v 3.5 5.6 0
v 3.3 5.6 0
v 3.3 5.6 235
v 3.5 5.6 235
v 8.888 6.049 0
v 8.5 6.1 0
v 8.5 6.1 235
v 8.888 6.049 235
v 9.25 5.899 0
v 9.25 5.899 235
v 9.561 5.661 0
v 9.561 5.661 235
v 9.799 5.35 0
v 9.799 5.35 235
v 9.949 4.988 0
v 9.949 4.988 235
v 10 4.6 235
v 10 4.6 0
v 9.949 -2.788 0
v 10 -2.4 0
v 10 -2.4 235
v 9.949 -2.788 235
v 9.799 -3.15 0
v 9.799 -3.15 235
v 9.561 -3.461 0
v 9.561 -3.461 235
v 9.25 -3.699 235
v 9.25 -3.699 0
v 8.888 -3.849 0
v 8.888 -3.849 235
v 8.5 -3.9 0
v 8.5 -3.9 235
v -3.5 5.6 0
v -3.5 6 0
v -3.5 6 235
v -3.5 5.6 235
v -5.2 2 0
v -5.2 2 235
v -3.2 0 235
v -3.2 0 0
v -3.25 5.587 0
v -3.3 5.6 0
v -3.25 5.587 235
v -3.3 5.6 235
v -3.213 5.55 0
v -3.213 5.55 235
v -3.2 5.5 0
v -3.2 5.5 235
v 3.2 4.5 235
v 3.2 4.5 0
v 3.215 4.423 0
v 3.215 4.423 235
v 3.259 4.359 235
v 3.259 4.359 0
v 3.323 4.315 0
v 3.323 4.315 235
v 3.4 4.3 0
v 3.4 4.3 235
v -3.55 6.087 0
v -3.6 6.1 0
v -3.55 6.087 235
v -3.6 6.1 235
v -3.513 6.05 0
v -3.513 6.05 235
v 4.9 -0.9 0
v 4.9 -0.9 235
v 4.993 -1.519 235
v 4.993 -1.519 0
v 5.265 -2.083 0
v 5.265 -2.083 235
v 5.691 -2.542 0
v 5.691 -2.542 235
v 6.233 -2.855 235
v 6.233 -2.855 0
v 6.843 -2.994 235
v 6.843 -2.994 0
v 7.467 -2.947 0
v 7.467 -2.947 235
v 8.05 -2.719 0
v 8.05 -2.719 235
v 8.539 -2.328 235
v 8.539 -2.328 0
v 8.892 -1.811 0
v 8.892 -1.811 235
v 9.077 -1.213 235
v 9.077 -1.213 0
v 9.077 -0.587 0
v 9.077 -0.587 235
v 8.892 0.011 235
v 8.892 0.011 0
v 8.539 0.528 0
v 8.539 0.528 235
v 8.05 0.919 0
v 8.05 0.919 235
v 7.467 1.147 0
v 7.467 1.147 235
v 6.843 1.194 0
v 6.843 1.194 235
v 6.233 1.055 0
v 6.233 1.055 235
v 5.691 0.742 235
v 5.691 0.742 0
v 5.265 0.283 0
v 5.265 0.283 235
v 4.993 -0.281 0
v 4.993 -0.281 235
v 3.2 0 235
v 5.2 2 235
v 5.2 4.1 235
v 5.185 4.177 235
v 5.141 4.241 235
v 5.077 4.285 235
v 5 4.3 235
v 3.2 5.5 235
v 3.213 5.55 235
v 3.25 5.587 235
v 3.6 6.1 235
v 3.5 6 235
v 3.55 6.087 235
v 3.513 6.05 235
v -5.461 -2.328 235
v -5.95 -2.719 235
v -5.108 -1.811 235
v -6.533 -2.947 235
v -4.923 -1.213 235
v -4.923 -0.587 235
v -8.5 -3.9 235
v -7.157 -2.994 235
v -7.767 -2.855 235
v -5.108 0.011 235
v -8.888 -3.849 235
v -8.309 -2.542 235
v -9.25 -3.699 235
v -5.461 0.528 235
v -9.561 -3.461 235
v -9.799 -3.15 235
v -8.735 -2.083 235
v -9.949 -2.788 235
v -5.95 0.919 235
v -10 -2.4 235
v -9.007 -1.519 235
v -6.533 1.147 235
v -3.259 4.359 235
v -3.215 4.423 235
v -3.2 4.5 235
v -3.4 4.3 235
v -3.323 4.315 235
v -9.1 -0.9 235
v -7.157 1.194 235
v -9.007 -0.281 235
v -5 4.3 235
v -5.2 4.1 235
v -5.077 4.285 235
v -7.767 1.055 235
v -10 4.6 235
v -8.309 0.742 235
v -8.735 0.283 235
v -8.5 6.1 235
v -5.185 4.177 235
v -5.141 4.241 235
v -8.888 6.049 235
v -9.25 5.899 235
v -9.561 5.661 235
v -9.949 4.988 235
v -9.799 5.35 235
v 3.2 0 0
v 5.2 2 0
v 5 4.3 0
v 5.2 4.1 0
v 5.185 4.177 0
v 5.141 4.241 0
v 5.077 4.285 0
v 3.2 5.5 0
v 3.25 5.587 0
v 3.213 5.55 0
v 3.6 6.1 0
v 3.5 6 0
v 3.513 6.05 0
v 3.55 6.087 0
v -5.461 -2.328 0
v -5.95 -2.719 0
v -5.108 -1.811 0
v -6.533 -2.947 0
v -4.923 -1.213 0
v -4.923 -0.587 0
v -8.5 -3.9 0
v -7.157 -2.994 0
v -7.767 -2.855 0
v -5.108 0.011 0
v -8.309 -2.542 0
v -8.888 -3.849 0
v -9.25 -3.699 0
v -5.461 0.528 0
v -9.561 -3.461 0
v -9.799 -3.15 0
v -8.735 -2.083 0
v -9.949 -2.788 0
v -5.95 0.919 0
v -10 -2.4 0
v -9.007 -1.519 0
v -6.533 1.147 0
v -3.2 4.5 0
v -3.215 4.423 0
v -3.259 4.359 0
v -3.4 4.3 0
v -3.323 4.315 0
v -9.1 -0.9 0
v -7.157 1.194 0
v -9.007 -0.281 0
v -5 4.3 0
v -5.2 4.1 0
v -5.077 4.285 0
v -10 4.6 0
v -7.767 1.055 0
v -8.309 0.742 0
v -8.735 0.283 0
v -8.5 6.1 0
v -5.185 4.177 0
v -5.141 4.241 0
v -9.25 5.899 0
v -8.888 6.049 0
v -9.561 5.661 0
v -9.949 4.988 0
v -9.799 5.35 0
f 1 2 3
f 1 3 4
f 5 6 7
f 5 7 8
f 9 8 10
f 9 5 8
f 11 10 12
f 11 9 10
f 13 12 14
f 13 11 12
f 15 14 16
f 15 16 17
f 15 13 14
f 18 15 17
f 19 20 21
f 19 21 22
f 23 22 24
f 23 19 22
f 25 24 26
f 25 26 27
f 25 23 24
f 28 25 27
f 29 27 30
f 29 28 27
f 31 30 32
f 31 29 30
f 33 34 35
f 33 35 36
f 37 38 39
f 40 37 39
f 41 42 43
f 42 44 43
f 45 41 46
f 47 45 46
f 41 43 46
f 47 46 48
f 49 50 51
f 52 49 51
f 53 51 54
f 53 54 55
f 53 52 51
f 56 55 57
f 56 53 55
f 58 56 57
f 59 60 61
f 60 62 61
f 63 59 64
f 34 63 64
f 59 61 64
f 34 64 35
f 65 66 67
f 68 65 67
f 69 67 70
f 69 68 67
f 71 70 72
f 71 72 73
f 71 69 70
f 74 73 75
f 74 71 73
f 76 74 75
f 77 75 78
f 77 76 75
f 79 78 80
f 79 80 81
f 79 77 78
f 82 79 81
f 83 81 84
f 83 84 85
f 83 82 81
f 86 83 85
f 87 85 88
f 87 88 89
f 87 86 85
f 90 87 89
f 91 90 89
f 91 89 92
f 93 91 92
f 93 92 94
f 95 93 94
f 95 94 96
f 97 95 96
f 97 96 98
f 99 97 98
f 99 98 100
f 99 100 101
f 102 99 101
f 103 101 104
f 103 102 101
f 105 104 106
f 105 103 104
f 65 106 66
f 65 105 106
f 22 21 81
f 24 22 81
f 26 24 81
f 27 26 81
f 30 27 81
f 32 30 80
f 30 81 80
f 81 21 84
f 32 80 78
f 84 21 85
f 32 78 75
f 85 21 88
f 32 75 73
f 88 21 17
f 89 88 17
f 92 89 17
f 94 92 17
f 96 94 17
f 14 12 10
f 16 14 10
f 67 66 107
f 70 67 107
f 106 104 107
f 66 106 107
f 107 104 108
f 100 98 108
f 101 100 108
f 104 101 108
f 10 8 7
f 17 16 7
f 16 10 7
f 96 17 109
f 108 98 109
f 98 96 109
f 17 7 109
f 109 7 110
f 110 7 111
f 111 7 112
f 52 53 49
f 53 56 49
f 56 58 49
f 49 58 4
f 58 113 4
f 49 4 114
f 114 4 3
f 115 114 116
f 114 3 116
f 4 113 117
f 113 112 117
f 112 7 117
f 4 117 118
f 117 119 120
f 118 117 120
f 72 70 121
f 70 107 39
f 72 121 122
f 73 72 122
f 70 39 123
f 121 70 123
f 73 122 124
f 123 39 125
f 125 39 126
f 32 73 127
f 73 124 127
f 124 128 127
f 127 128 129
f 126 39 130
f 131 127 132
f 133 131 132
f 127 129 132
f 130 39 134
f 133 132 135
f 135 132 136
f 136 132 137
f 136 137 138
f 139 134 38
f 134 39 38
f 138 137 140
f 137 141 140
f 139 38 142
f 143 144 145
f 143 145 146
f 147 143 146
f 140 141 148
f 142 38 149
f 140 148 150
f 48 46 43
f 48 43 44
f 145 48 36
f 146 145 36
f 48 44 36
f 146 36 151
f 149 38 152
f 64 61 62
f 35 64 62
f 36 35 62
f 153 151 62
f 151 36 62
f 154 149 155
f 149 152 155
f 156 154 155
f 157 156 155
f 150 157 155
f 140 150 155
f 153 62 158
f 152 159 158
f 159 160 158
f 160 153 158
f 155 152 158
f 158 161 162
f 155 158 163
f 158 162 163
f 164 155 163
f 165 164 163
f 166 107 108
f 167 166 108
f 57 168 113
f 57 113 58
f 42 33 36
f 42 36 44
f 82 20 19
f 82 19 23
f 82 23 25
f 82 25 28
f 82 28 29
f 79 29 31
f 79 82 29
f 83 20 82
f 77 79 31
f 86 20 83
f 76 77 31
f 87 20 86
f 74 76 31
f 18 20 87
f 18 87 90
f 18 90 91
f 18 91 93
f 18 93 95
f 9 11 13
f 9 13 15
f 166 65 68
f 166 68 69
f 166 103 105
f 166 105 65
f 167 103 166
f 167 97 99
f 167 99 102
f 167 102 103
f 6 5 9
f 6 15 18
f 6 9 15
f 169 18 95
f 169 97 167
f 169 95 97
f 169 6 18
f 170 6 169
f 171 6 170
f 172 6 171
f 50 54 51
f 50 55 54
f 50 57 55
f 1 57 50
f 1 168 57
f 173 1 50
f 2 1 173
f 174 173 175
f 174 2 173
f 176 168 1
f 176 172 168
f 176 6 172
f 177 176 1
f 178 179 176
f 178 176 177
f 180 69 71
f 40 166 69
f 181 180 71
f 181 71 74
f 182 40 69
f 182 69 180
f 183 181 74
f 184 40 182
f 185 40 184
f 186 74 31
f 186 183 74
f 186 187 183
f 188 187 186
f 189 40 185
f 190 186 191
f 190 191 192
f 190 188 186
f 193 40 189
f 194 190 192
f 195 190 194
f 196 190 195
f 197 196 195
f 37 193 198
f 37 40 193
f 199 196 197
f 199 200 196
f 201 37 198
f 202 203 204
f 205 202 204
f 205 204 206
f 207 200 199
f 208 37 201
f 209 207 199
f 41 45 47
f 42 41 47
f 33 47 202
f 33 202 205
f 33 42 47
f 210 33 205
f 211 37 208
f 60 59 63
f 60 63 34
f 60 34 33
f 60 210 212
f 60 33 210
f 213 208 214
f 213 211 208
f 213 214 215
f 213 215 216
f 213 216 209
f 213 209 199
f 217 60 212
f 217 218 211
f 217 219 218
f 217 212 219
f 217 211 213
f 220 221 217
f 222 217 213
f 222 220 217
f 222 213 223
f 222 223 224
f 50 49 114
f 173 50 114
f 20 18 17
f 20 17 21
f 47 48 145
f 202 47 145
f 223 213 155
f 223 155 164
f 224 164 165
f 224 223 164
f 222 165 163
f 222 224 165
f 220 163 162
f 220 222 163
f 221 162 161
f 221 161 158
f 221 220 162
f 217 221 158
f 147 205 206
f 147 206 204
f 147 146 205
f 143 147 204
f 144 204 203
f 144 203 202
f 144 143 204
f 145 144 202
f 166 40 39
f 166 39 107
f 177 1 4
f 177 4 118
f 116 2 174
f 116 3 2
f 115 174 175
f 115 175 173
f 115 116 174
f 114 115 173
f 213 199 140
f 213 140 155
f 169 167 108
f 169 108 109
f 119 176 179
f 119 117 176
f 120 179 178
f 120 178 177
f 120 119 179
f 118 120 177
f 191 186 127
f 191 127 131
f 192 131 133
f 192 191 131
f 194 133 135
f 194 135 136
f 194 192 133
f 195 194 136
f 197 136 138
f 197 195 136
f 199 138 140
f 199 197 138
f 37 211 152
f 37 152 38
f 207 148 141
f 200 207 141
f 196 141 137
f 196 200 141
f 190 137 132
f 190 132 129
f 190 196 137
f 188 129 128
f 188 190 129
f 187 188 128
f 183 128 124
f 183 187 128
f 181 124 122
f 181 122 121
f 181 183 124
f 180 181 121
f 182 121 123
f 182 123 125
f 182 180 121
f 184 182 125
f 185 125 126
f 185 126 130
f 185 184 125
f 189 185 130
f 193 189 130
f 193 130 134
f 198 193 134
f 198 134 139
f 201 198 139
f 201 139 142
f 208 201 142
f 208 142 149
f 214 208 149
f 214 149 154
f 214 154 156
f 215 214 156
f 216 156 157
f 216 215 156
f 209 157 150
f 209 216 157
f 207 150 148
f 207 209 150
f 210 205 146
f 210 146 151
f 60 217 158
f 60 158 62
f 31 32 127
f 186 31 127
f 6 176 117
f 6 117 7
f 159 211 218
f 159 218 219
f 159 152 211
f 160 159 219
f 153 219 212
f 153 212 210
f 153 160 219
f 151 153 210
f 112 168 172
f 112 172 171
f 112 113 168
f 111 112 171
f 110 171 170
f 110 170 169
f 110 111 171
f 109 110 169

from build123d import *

# Parameters (mm, degrees)
SKETCH_1_R      = 2.1
EXTRUDE_1_DEPTH = 235
FILLET_1_R      = 0.1
FILLET_2_R      = 0.2


with BuildPart() as part:
    # 草图1 → 凸台-拉伸1 (new body)
    with BuildSketch(Plane.XY):
        with BuildLine():
            Line((8.5, -3.9), (-8.5, -3.9))
            ThreePointArc((-8.5, -3.9), (-9.560660172, -3.460660172), (-10, -2.4))
            Line((-10, -2.4), (-10, 4.6))
            ThreePointArc((-10, 4.6), (-9.560660172, 5.660660172), (-8.5, 6.1))
            Line((-8.5, 6.1), (-3.5, 6.1))
            Line((-3.5, 6.1), (-3.5, 5.6))
            Line((-3.5, 5.6), (-3.2, 5.6))
            Line((-3.2, 5.6), (-3.2, 4.3))
            Line((-3.2, 4.3), (-5.2, 4.3))
            Line((-5.2, 4.3), (-5.2, 2))
            Line((-5.2, 2), (-3.2, 0))
            Line((-3.2, 0), (3.2, 0))
            Line((3.2, 0), (5.2, 2))
            Line((5.2, 2), (5.2, 4.3))
            Line((5.2, 4.3), (3.2, 4.3))
            Line((3.2, 4.3), (3.2, 5.6))
            Line((3.2, 5.6), (3.5, 5.6))
            Line((3.5, 5.6), (3.5, 6.1))
            Line((3.5, 6.1), (8.5, 6.1))
            ThreePointArc((8.5, 6.1), (9.560660172, 5.660660172), (10, 4.6))
            Line((10, 4.6), (10, -2.4))
            ThreePointArc((10, -2.4), (9.560660172, -3.460660172), (8.5, -3.9))
        make_face()
        with Locations(Location((-7, -0.9, 0), (0, 0, 180))):
            Circle(SKETCH_1_R, mode=Mode.SUBTRACT)
        with Locations(Location((7, -0.9, 0), (0, 0, 180))):
            Circle(SKETCH_1_R, mode=Mode.SUBTRACT)
    extrude(amount=EXTRUDE_1_DEPTH)

    # 圆角1
    fillet_1_edges = [part.edges().sort_by_distance(p)[0] for p in [
        (3.2, 5.6, 117.5),
        (3.5, 6.1, 117.5),
        (-3.5, 6.1, 117.5),
        (-3.2, 5.6, 117.5),
    ]]
    fillet(fillet_1_edges, radius=FILLET_1_R)

    # 圆角2
    fillet_2_edges = [part.edges().sort_by_distance(p)[0] for p in [
        (5.2, 4.3, 117.5),
        (3.2, 4.3, 117.5),
        (-3.2, 4.3, 117.5),
        (-5.2, 4.3, 117.5),
    ]]
    fillet(fillet_2_edges, radius=FILLET_2_R)


solid = part.part
